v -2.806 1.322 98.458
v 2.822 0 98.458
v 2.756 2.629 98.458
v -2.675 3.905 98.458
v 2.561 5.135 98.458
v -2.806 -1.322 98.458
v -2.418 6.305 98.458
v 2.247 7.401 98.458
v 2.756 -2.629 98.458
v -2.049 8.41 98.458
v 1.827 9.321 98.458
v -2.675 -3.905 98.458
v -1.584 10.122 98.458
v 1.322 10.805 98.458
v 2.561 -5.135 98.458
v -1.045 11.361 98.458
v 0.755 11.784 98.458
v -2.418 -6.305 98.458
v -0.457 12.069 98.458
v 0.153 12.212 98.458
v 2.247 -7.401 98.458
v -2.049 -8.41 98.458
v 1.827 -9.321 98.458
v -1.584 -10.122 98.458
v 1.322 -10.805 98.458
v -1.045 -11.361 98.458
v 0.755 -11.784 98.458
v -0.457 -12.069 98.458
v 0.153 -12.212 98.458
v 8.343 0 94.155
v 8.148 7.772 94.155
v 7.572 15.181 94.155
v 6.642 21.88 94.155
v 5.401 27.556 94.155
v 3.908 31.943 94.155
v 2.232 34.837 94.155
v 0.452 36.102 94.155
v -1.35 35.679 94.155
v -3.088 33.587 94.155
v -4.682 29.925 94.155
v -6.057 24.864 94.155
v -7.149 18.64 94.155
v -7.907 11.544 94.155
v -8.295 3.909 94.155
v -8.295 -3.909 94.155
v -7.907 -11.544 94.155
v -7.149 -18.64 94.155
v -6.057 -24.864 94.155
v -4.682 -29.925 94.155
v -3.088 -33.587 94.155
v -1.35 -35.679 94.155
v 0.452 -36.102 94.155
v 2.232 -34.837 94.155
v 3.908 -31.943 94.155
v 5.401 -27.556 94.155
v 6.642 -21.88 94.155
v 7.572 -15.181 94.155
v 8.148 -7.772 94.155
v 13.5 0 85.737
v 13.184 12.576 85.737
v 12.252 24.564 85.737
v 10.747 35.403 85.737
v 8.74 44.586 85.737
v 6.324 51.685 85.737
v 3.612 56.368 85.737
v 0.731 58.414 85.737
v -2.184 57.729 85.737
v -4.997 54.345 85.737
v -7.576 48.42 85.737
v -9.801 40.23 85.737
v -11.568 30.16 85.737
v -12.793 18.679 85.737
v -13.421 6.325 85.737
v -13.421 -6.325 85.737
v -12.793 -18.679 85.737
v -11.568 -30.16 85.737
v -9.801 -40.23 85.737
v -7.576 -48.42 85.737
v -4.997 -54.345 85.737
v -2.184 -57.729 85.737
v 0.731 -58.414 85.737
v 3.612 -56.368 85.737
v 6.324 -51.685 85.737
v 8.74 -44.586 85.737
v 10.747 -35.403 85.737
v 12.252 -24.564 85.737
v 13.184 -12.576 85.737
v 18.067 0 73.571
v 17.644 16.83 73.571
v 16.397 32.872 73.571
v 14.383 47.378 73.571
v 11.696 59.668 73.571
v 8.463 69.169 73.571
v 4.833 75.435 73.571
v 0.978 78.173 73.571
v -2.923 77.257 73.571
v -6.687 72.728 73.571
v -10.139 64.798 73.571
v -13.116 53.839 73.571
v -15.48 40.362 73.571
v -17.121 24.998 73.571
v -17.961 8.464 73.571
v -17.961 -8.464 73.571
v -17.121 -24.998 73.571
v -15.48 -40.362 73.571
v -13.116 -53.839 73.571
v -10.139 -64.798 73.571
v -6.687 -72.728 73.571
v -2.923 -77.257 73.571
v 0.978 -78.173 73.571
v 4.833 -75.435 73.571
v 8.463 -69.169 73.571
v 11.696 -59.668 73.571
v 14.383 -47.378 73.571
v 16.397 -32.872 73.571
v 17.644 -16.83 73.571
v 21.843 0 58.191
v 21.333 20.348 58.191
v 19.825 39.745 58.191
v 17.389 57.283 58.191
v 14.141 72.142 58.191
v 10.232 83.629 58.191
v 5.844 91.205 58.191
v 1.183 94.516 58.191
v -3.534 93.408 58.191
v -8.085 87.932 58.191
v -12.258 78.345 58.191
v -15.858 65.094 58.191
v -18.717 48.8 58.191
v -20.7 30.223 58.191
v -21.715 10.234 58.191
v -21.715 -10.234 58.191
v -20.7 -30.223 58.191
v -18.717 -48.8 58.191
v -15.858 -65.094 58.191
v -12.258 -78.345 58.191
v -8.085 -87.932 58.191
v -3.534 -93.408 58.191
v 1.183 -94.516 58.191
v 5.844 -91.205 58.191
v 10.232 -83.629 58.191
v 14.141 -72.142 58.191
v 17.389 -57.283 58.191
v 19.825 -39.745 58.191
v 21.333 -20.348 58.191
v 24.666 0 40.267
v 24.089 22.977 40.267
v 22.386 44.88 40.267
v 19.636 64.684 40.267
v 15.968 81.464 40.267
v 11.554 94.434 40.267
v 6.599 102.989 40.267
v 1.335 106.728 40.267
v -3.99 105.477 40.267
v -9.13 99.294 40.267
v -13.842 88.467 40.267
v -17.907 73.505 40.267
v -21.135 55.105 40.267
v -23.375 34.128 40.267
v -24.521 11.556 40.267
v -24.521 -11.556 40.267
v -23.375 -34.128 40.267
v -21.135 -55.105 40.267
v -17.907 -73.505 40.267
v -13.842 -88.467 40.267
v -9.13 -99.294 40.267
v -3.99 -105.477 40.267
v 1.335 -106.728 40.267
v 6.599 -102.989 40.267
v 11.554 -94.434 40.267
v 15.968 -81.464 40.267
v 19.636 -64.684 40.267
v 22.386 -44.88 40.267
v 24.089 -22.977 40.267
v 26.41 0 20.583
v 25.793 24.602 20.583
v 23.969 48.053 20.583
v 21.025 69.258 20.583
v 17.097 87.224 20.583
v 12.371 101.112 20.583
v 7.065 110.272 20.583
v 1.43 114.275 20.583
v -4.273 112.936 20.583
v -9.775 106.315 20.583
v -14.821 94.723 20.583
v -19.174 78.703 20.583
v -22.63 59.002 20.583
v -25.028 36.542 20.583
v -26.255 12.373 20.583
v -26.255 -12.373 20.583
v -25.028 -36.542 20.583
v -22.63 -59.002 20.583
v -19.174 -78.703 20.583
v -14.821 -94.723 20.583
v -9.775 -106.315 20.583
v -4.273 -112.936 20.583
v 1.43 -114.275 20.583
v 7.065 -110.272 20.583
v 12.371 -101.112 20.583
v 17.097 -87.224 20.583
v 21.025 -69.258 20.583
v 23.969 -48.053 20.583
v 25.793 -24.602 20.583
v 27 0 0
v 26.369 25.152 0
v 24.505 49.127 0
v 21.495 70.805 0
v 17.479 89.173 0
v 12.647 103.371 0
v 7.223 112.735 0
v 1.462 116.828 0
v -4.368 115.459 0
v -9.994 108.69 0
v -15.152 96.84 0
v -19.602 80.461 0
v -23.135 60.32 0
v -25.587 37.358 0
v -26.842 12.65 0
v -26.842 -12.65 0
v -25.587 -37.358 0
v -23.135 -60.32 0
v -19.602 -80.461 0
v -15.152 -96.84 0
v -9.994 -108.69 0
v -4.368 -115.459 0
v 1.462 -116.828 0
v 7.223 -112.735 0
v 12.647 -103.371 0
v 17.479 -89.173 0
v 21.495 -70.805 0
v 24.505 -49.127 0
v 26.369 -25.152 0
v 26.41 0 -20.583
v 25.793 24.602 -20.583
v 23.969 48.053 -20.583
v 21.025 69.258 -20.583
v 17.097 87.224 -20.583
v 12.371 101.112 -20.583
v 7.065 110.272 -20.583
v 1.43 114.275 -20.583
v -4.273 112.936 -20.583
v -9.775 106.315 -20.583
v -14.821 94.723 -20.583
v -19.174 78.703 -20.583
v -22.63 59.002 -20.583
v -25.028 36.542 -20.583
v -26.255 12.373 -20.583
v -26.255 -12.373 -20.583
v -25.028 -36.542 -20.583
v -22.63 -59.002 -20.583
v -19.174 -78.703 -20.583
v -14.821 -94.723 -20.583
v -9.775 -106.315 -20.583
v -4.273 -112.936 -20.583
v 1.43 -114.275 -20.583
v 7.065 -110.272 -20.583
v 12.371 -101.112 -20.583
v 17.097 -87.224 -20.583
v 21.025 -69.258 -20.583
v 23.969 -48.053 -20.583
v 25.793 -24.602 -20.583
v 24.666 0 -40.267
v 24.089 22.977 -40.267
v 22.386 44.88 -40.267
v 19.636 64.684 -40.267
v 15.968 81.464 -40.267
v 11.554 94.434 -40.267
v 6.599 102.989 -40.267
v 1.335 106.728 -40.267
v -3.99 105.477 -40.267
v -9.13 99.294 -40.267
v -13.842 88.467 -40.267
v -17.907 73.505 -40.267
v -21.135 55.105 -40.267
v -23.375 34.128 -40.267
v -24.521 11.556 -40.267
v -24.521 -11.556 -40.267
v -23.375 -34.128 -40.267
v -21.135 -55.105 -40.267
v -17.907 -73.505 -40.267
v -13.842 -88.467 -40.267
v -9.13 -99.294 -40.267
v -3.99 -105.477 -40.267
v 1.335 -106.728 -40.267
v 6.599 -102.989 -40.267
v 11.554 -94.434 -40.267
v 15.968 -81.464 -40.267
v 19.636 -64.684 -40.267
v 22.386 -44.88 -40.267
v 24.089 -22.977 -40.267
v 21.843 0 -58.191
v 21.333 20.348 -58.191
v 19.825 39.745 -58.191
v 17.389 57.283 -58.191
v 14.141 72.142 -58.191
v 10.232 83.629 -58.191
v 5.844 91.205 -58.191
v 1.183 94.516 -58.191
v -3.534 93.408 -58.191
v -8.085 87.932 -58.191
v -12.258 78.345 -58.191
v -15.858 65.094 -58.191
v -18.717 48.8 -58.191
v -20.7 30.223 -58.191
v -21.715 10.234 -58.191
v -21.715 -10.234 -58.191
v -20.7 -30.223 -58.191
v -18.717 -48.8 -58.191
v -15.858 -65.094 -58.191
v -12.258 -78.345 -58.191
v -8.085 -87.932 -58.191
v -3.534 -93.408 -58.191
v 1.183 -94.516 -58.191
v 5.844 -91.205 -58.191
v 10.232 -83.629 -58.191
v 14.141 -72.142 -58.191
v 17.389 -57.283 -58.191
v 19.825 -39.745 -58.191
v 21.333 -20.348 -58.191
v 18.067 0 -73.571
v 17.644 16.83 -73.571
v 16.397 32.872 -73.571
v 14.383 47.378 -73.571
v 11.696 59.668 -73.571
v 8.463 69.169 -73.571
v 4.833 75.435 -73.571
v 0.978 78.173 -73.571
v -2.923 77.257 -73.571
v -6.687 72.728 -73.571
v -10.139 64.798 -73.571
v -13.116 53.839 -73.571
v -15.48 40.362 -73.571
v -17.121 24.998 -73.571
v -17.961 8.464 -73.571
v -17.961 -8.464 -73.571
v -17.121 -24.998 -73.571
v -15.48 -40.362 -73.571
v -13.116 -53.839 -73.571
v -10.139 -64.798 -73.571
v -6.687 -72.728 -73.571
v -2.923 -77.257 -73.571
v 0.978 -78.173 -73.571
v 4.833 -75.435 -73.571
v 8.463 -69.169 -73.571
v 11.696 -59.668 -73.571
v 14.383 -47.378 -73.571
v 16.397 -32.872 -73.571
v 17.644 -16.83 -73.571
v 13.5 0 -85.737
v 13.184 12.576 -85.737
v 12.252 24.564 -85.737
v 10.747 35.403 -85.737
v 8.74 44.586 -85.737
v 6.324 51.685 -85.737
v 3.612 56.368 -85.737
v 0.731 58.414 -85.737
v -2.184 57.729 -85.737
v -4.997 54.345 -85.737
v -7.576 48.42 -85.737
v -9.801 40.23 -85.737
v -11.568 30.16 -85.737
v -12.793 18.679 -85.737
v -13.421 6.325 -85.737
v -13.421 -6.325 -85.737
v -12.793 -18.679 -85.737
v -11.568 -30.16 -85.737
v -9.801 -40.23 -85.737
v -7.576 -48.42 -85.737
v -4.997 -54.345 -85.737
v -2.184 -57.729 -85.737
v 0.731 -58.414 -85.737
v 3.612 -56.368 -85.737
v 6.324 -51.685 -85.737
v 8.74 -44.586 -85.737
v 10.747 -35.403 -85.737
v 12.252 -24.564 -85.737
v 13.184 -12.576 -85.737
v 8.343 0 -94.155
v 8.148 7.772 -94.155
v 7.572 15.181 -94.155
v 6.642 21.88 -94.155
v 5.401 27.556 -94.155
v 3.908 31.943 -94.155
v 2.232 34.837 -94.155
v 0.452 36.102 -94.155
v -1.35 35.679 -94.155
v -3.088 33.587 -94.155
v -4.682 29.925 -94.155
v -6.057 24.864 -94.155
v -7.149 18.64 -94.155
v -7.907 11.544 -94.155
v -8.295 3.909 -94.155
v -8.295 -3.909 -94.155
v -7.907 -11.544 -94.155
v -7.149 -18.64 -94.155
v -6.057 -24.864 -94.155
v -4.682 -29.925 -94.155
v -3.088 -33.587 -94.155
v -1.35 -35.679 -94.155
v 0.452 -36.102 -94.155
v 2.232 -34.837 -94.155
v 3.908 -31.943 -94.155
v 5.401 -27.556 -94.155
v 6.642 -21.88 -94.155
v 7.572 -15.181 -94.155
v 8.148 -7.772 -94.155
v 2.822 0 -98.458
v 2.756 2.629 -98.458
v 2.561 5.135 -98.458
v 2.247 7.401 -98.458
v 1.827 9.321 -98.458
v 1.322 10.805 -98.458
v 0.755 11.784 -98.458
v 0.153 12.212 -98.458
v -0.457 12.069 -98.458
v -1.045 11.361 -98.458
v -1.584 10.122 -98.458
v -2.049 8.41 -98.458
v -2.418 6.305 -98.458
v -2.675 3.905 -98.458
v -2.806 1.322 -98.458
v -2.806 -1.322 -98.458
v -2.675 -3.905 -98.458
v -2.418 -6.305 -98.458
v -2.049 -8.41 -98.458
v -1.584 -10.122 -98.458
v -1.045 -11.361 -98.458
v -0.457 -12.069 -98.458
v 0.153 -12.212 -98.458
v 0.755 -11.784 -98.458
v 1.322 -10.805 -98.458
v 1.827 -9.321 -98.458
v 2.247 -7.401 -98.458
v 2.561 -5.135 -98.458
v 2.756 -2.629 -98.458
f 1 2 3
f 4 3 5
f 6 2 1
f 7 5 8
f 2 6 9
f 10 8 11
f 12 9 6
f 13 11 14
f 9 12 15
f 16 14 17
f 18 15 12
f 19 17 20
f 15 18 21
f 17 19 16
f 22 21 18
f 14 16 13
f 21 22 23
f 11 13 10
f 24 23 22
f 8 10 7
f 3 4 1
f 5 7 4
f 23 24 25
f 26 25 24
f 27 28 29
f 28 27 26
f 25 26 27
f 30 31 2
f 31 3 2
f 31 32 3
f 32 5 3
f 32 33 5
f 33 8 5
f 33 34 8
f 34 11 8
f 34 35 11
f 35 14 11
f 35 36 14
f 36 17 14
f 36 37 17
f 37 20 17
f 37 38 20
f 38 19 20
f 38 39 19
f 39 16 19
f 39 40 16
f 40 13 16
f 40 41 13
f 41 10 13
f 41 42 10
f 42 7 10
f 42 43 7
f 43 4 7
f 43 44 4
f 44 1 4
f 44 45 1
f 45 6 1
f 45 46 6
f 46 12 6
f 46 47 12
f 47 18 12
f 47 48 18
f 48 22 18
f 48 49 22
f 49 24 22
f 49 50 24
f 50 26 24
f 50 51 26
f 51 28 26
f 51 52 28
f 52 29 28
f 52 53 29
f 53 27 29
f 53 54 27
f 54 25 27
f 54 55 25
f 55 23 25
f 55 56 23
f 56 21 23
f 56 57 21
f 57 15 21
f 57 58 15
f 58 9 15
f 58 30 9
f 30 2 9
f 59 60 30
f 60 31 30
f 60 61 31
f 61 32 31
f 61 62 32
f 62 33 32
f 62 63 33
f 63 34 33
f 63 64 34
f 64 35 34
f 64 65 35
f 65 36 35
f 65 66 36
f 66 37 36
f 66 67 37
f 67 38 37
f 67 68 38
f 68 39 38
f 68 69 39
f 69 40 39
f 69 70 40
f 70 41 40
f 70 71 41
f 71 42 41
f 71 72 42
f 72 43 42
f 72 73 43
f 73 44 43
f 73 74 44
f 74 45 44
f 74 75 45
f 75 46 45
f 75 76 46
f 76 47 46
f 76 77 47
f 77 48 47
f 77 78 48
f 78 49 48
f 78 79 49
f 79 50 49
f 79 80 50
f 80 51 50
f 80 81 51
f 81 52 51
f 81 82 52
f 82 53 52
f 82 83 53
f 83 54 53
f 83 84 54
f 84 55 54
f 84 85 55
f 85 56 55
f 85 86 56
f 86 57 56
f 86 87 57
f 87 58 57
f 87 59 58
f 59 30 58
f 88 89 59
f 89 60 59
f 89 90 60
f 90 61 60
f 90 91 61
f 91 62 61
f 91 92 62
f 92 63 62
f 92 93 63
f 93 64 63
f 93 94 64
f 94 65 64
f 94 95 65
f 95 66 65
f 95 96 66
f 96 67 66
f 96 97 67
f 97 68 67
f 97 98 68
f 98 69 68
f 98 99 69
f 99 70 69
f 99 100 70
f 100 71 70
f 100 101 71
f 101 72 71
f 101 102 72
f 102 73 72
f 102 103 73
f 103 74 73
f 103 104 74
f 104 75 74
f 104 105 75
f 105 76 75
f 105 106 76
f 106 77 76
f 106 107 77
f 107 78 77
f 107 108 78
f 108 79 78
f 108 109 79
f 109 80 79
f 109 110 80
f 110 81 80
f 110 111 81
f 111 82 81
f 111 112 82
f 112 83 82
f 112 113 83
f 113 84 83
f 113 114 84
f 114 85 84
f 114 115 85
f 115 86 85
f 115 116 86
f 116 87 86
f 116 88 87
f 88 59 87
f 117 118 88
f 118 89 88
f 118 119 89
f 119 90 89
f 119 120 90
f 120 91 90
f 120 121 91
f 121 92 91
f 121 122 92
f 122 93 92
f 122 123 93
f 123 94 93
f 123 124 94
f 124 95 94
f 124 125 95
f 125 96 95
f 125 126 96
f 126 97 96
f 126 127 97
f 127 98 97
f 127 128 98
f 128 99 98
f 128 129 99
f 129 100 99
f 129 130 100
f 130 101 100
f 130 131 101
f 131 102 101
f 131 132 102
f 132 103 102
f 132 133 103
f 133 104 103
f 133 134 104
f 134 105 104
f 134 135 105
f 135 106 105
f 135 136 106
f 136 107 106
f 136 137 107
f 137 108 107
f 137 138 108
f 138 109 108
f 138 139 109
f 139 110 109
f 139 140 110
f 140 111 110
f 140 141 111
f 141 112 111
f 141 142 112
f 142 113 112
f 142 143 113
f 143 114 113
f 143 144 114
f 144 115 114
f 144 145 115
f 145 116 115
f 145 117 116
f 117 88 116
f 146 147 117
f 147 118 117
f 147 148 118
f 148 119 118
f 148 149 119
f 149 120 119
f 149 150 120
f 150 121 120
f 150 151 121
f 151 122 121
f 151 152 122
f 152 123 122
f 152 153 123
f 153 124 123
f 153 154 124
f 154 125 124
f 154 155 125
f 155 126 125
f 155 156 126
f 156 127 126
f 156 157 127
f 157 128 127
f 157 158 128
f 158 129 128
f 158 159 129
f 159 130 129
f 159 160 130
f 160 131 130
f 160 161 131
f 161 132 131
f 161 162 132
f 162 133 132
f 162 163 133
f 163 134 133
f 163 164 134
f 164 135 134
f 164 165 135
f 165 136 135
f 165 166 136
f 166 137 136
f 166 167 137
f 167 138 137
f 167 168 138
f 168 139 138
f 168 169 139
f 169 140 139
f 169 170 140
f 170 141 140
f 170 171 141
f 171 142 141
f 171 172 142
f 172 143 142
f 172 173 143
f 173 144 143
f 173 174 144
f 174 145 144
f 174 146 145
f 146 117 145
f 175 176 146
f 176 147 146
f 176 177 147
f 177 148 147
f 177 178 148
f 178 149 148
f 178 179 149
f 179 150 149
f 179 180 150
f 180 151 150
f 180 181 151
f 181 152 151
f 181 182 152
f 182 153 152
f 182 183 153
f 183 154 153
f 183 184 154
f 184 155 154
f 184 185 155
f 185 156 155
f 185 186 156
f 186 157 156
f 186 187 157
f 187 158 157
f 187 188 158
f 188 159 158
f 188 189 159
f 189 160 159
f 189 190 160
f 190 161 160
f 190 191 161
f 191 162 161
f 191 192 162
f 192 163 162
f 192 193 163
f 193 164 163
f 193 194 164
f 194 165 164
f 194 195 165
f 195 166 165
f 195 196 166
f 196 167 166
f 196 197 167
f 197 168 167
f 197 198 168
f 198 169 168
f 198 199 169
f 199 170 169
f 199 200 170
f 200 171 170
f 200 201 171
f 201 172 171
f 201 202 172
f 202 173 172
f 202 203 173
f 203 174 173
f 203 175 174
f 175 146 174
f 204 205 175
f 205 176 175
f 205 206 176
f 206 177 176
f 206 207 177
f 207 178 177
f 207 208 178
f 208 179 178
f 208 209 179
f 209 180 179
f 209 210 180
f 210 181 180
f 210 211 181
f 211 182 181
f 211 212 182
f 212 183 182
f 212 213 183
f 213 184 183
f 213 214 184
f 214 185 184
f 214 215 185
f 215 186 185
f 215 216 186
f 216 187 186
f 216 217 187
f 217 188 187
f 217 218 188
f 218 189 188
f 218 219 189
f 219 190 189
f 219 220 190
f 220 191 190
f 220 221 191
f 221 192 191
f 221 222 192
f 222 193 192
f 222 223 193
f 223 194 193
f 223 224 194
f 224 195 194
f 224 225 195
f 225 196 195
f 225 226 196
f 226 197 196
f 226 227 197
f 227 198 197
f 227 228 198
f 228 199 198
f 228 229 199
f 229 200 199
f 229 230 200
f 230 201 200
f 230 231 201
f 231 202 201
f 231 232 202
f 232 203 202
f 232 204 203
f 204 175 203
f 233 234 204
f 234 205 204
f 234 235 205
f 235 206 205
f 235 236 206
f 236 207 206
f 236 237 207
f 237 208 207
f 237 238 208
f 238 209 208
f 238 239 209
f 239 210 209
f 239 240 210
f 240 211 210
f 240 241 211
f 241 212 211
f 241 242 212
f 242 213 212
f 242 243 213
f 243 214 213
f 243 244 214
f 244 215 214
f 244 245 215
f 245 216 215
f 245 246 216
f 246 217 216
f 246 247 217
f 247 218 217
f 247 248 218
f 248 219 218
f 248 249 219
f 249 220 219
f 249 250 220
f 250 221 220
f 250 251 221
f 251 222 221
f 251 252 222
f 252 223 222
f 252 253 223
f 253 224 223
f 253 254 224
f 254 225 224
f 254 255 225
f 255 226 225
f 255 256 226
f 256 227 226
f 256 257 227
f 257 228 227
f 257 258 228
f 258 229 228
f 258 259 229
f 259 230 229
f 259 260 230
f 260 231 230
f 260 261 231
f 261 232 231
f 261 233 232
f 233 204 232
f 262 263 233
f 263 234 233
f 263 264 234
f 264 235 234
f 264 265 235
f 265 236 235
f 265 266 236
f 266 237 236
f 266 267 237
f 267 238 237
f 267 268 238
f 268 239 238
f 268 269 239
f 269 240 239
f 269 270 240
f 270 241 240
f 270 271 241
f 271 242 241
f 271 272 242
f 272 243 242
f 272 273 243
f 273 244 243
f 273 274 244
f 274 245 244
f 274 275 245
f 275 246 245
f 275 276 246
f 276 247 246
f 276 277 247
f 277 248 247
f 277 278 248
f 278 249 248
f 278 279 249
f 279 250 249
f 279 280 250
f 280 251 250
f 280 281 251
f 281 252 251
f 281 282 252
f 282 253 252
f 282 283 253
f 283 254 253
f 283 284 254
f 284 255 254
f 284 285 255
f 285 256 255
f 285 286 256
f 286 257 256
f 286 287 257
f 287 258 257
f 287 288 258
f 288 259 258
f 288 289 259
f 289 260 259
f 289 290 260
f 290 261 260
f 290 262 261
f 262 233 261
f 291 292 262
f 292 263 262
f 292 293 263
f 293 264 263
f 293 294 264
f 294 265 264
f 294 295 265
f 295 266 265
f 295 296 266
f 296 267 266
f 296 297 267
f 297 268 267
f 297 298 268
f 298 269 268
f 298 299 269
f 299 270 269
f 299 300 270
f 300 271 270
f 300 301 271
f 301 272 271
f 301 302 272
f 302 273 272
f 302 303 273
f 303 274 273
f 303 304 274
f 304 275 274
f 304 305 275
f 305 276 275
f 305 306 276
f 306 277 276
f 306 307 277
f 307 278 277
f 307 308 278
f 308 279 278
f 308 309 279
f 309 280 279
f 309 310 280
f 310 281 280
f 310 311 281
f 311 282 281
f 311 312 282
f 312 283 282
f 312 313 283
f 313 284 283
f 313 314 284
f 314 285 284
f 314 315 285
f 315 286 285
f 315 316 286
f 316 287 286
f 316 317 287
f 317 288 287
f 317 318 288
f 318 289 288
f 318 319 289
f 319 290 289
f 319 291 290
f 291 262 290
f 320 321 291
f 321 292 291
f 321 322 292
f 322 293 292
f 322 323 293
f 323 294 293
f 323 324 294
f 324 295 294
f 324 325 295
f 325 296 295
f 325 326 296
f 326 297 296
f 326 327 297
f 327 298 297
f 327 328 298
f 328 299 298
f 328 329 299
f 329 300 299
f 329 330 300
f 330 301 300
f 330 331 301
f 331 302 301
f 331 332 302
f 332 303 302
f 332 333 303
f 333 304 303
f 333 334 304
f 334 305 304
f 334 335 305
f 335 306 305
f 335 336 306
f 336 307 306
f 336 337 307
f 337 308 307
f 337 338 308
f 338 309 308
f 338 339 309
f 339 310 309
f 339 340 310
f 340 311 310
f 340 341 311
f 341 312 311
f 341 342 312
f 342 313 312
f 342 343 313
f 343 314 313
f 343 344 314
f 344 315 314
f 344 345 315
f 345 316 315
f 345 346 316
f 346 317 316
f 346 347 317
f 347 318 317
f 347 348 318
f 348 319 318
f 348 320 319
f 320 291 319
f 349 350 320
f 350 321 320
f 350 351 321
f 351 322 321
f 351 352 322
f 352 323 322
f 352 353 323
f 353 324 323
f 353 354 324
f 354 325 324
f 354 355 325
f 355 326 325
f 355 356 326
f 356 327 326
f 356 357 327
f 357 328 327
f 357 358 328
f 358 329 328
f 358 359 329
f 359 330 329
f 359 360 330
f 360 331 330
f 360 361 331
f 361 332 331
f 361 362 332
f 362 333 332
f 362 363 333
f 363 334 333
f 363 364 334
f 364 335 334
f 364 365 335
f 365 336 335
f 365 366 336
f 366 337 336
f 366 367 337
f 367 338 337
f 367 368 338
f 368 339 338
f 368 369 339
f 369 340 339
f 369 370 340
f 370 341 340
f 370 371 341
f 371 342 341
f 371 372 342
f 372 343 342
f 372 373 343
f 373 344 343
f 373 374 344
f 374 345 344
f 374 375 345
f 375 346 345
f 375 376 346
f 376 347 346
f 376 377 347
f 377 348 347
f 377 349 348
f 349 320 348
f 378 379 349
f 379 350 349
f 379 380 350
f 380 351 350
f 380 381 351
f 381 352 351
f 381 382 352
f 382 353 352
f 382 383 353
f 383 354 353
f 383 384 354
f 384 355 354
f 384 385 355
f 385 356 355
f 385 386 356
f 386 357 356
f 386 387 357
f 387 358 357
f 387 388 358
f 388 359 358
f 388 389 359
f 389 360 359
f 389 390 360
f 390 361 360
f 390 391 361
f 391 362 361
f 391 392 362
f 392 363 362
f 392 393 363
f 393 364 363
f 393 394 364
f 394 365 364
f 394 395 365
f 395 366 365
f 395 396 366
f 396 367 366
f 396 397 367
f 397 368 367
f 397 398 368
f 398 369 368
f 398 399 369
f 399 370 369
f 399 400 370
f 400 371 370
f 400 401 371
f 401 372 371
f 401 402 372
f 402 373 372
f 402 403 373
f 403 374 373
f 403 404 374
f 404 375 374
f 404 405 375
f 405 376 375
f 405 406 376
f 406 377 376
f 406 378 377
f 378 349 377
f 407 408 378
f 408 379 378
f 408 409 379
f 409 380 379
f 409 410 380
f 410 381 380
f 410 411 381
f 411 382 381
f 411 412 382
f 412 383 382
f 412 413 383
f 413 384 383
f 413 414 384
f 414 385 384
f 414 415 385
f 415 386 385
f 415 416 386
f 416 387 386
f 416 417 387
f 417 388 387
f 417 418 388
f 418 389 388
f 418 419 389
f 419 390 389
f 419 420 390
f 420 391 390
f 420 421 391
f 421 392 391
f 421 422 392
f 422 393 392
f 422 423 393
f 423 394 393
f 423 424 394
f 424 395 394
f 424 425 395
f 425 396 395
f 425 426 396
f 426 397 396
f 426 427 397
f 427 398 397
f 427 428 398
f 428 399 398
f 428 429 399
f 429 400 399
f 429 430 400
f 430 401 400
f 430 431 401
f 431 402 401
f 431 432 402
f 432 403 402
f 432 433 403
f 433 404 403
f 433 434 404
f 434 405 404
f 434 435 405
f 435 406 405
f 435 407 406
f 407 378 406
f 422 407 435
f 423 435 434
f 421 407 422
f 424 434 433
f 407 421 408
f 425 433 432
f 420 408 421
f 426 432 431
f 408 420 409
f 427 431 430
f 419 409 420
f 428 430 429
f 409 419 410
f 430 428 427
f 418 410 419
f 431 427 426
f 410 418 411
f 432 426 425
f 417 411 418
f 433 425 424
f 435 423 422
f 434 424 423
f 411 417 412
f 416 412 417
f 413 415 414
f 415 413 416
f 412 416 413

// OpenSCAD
// Generated by SolidPython 1.0.1 on 2020-07-29 00:46:45


scale(v = [3, 13, 11]) {
	sphere(r = 9);
}
/***********************************************
*********      SolidPython code:      **********
************************************************
 
# import packages: SolidPython
from solid import *
from solid.utils import *
from itertools import chain, combinations, permutations


class Resize:

    def __init__(self, scad_file):
        self.scad_file = scad_file
        #self.scad_file = import_scad(scad_file)
        # cone/cylinder param:
        self.r1 = 0
        self.r2 = 0
        self.h = 0
        # rectangular prism param:
        self.w = 0
        self.l = 0
        # ellipse param:
        self.r = 0

    # import OpenScad code (file name corresponds to shape)


    # classify shape + parameters
    def assign(self, param1, param2, param3):
        if self.scad_file == 'cone.scad':
            self.r1 = param1
            self.r2 = param2
            self.h = param3
        elif self.scad_file == 'cylinder.scad':
            self.r1 = param1
            self.r2 = param2
            self.h = param3
        elif self.scad_file == 'rectangularPrism.scad':
            self.h = param1
            self.l = param2
            self.w = param3
        else:
            self.r = param1
            self.h = param2

    # resize parameters
    def iterate(self):
        x = range(3, 20, 2)
        i = 1
        if self.scad_file == 'cone.scad':
            tempList = list(permutations(x, 2))
            for temp in tempList:
                param1 = temp[0]
                param2 = temp[1]
                filepath = 'produced_scad_files/' + 'cone' + str(param1) + '_' + str(param2) + '_' + '.scad'
                scad_render_to_file(cylinder(h=param1, r1=param2, r2=0), filepath)

        elif self.scad_file == 'cylinder.scad':
            tempList = list(permutations(x, 3))
            for temp in tempList:
                param1 = temp[0]
                param2 = temp[1]
                filepath = 'produced_scad_files/' + 'cylinder' + str(param1) + '_' + str(param2) + '_' + '.scad'
                scad_render_to_file(cylinder(h=param1, r1=param2, r2=param2), filepath)

        elif self.scad_file == 'rectangularPrism.scad':
            tempList = list(permutations(x, 3))
            for temp in tempList:
                param1 = temp[0]
                param2 = temp[1]
                param3 = temp[2]
                filepath = 'produced_scad_files/' + 'rectangularPrism' + str(param1) + '_' + str(param2) + '_' + str(
                    param3) + '.scad'
                scad_render_to_file(cube(size=(param1, param2, param3)), filepath)

        elif self.scad_file == 'ellipse.scad':
            tempList = list(permutations(x, 4))
            for temp in tempList:
                param1 = temp[0]
                param2 = temp[1]
                param3 = temp[2]
                param4 = temp[3]
                filepath = 'produced_scad_files/' + 'ellipse' + str(param1) + '_' + str(param2) + '_' + str(param3) + '_' + str(param4) + '.scad'
                scad_render_to_file(scale([param1, param2, param3])(sphere(r=param4)), filepath)

    def render_to_scadfile(self):
        scad_render_to_file(scad, 'example.scad') 
 
************************************************/
